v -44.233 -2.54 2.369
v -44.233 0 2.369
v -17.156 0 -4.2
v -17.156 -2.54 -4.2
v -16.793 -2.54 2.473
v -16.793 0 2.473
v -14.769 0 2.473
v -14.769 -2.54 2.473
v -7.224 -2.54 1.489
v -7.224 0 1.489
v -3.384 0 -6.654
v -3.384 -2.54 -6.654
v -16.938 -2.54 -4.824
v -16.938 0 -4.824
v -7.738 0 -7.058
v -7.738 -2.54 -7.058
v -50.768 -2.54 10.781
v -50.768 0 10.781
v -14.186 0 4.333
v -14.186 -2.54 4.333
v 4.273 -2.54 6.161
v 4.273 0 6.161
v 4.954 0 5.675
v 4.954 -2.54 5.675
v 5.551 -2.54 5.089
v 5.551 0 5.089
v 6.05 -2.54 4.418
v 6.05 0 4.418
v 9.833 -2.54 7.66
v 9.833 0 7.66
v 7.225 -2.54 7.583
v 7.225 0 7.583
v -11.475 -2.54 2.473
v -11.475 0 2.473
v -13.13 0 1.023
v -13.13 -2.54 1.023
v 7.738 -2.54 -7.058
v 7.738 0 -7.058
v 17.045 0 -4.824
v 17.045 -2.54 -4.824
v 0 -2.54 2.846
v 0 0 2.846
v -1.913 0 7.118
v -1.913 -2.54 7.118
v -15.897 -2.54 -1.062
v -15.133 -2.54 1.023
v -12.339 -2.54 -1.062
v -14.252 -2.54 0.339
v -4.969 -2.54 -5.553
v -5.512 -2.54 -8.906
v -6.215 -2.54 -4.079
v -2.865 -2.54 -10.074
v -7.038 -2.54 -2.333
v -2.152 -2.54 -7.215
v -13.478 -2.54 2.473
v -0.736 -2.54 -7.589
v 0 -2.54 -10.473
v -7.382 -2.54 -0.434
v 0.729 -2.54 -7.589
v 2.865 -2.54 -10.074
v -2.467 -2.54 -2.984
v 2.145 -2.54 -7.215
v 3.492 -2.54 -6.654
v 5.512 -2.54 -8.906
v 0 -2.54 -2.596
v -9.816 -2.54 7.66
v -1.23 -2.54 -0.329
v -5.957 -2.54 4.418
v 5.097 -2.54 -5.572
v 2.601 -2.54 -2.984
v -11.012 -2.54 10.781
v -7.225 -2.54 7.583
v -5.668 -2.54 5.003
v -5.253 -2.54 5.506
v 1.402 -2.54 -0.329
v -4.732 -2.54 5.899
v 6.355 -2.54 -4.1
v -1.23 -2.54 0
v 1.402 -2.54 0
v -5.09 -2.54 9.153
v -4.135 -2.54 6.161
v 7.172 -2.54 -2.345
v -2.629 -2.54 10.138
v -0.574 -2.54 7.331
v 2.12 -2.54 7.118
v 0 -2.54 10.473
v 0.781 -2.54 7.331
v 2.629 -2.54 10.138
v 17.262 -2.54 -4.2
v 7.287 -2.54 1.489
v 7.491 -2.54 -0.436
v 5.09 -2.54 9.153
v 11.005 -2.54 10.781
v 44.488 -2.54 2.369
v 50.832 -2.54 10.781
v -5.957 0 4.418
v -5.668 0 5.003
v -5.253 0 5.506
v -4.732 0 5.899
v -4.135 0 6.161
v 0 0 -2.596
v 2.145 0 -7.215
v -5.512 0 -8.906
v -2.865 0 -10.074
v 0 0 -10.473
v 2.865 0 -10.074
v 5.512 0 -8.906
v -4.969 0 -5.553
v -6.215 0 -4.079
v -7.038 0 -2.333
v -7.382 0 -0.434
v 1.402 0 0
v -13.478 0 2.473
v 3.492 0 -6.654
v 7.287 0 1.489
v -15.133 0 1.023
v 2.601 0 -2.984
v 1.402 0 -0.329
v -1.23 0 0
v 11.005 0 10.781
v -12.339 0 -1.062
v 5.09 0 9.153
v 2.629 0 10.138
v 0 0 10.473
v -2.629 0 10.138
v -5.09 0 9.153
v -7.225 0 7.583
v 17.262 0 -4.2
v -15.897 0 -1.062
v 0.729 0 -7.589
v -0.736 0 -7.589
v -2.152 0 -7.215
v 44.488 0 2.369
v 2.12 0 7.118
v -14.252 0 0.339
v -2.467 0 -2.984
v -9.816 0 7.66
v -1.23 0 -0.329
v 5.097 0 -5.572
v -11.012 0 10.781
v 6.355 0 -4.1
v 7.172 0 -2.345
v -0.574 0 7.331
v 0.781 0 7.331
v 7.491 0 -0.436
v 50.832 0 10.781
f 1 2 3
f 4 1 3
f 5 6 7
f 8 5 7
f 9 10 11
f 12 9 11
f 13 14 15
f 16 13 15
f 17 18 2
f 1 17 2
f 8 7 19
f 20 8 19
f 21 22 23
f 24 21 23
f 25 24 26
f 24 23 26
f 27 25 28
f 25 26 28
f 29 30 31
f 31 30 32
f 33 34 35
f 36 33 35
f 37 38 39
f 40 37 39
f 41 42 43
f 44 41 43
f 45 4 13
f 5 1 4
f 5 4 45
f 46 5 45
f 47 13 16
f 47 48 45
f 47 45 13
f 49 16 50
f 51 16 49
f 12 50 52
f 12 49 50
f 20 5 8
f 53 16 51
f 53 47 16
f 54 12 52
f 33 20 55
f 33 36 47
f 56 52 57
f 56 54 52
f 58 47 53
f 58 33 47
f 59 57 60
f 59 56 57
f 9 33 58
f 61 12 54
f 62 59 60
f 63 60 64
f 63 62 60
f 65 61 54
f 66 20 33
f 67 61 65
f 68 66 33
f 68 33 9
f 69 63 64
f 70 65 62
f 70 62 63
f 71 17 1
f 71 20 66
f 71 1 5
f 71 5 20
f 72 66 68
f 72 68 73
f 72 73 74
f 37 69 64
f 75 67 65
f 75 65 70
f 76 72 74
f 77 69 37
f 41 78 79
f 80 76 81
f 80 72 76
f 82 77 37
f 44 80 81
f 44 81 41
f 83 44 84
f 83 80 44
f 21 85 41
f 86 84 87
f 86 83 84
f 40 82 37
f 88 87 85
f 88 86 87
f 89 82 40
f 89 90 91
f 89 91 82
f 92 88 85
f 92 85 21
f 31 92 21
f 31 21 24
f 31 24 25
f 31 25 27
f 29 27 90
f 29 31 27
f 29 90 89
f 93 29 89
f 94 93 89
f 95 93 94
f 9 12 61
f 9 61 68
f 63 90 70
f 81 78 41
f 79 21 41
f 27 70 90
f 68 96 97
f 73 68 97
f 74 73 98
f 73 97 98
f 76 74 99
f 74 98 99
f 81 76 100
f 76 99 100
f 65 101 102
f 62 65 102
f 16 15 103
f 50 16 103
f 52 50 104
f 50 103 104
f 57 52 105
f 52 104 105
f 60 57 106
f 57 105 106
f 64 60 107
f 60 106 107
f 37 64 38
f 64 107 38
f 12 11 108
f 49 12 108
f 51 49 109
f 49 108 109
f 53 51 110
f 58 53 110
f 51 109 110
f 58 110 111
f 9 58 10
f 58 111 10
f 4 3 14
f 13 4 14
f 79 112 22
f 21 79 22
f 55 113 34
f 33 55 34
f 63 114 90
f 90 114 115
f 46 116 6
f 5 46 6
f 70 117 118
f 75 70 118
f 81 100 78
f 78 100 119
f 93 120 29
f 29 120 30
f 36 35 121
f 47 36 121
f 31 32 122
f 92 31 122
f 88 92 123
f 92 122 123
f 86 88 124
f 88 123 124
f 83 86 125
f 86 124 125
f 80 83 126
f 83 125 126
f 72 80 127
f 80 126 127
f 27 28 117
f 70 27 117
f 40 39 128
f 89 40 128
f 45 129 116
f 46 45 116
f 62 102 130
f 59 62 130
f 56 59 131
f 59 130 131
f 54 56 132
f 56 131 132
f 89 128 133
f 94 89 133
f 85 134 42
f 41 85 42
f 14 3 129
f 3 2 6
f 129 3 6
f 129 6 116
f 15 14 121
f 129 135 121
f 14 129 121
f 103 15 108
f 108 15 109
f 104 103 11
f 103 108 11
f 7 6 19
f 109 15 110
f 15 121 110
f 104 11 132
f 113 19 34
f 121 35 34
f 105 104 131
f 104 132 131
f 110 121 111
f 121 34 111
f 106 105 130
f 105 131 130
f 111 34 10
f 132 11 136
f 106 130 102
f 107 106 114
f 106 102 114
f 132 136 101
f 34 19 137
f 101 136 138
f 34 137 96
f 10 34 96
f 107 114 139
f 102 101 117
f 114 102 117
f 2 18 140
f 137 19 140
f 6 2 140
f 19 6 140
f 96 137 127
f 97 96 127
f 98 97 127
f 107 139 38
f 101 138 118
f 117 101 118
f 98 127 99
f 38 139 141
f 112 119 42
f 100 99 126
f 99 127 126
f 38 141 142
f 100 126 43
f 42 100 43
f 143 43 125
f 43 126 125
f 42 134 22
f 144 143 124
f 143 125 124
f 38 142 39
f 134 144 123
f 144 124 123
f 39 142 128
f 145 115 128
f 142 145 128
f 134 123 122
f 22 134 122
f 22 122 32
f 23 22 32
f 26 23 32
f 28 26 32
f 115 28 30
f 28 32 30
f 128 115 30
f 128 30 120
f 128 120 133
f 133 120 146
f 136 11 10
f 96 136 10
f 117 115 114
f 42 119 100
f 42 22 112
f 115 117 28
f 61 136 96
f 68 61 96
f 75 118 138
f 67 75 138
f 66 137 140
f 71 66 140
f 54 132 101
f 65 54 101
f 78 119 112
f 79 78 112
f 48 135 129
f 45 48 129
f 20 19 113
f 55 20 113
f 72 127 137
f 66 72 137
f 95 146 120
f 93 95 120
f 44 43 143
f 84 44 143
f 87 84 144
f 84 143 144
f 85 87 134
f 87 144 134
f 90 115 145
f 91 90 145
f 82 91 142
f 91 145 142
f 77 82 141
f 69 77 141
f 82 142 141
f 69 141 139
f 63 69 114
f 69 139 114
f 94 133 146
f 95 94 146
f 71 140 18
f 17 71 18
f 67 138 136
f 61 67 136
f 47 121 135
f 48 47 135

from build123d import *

# Parameters (mm, degrees)
F1_DEPTH = 2.54


with BuildPart() as f1:
    # F0 (on Front) → F1 (new body)
    with BuildSketch(Plane.XZ):
        with BuildLine():
            ThreePointArc((7.738306, -7.057663), (9.765713, -3.784552), (10.473394, 0))
            ThreePointArc((10.473394, 0), (9.627005, 4.124653), (7.224635, 7.582653))
            ThreePointArc((7.224635, 7.582653), (0, 10.473394), (-7.224635, 7.582653))
            ThreePointArc((-7.224635, 7.582653), (-10.466954, 0.367244), (-7.738306, -7.057663))
            ThreePointArc((-7.738306, -7.057663), (0, -10.473394), (7.738306, -7.057663))
        make_face()
        with BuildLine():
            Line((-2.152094, -7.214504), (0, -2.595979))
            Line((0, -2.595979), (2.144959, -7.214504))
            ThreePointArc((2.144959, -7.214504), (-0.003567, -7.636494), (-2.152094, -7.214504))
        make_face(mode=Mode.SUBTRACT)
        with BuildLine():
            ThreePointArc((-3.384339, -6.653862), (-6.683961, -3.233143), (-7.223777, 1.488871))
            Line((-7.223777, 1.488871), (-3.384339, -6.653862))
        make_face(mode=Mode.SUBTRACT)
        with BuildLine():
            Line((3.492318, -6.653862), (7.286586, 1.488871))
            ThreePointArc((7.286586, 1.488871), (6.822869, -3.250425), (3.492318, -6.653862))
        make_face(mode=Mode.SUBTRACT)
        with BuildLine():
            ThreePointArc((-5.957007, 4.418221), (-5.252536, 5.505791), (-4.134786, 6.161323))
            Line((-4.134786, 6.161323), (-1.229617, 0))
            Line((-1.229617, 0), (1.402125, 0))
            Line((1.402125, 0), (4.273116, 6.161323))
            ThreePointArc((4.273116, 6.161323), (5.263901, 5.39392), (6.050396, 4.418221))
            Line((6.050396, 4.418221), (2.601226, -2.98391))
            Line((2.601226, -2.98391), (1.402125, -0.328891))
            Line((1.402125, -0.328891), (-1.229617, -0.328891))
            Line((-1.229617, -0.328891), (-2.466776, -2.98391))
            Line((-2.466776, -2.98391), (-5.957007, 4.418221))
        make_face(mode=Mode.SUBTRACT)
        with BuildLine():
            Line((0, 2.846012), (-1.913186, 7.11832))
            ThreePointArc((-1.913186, 7.11832), (0.103343, 7.357841), (2.119873, 7.11832))
            Line((2.119873, 7.11832), (0, 2.846012))
        make_face(mode=Mode.SUBTRACT)
        with BuildLine():
            ThreePointArc((7.224635, 7.582653), (9.627005, 4.124653), (10.473394, 0))
            ThreePointArc((10.473394, 0), (9.765713, -3.784552), (7.738306, -7.057663))
            Line((7.738306, -7.057663), (17.044773, -4.823679))
            Line((17.044773, -4.823679), (17.261992, -4.200394))
            Line((17.261992, -4.200394), (21.515753, 8.005273))
            Line((21.515753, 8.005273), (9.83273, 7.65978))
            Line((9.83273, 7.65978), (7.224635, 7.582653))
        make_face()
        with BuildLine():
            ThreePointArc((-7.738306, -7.057663), (-10.466954, 0.367244), (-7.224635, 7.582653))
            Line((-7.224635, 7.582653), (-9.815511, 7.65978))
            Line((-9.815511, 7.65978), (-21.421401, 8.005273))
            Line((-21.421401, 8.005273), (-17.155705, -4.200394))
            Line((-17.155705, -4.200394), (-16.937877, -4.823679))
            Line((-16.937877, -4.823679), (-7.738306, -7.057663))
        make_face()
        Polygon((-14.769453, 2.473412), (-14.185613, 4.333009), (-13.477944, 2.473412), (-11.474869, 2.473412), (-13.129719, 1.022873), (-12.338734, -1.062449), (-14.252342, 0.338954), (-15.897308, -1.062449), (-15.132699, 1.022873), (-16.792862, 2.473412), align=None, mode=Mode.SUBTRACT)
        Polygon((11.004867, 10.780503), (9.83273, 7.65978), (21.515753, 8.005273), (17.261992, -4.200394), (44.487608, 2.368847), (50.83166, 10.780503), align=None)
        Polygon((-21.421401, 8.005273), (-9.815511, 7.65978), (-11.012142, 10.780503), (-50.76834, 10.780503), (-44.232576, 2.368847), (-17.155705, -4.200394), align=None)
    extrude(amount=F1_DEPTH)


solid = f1.part
